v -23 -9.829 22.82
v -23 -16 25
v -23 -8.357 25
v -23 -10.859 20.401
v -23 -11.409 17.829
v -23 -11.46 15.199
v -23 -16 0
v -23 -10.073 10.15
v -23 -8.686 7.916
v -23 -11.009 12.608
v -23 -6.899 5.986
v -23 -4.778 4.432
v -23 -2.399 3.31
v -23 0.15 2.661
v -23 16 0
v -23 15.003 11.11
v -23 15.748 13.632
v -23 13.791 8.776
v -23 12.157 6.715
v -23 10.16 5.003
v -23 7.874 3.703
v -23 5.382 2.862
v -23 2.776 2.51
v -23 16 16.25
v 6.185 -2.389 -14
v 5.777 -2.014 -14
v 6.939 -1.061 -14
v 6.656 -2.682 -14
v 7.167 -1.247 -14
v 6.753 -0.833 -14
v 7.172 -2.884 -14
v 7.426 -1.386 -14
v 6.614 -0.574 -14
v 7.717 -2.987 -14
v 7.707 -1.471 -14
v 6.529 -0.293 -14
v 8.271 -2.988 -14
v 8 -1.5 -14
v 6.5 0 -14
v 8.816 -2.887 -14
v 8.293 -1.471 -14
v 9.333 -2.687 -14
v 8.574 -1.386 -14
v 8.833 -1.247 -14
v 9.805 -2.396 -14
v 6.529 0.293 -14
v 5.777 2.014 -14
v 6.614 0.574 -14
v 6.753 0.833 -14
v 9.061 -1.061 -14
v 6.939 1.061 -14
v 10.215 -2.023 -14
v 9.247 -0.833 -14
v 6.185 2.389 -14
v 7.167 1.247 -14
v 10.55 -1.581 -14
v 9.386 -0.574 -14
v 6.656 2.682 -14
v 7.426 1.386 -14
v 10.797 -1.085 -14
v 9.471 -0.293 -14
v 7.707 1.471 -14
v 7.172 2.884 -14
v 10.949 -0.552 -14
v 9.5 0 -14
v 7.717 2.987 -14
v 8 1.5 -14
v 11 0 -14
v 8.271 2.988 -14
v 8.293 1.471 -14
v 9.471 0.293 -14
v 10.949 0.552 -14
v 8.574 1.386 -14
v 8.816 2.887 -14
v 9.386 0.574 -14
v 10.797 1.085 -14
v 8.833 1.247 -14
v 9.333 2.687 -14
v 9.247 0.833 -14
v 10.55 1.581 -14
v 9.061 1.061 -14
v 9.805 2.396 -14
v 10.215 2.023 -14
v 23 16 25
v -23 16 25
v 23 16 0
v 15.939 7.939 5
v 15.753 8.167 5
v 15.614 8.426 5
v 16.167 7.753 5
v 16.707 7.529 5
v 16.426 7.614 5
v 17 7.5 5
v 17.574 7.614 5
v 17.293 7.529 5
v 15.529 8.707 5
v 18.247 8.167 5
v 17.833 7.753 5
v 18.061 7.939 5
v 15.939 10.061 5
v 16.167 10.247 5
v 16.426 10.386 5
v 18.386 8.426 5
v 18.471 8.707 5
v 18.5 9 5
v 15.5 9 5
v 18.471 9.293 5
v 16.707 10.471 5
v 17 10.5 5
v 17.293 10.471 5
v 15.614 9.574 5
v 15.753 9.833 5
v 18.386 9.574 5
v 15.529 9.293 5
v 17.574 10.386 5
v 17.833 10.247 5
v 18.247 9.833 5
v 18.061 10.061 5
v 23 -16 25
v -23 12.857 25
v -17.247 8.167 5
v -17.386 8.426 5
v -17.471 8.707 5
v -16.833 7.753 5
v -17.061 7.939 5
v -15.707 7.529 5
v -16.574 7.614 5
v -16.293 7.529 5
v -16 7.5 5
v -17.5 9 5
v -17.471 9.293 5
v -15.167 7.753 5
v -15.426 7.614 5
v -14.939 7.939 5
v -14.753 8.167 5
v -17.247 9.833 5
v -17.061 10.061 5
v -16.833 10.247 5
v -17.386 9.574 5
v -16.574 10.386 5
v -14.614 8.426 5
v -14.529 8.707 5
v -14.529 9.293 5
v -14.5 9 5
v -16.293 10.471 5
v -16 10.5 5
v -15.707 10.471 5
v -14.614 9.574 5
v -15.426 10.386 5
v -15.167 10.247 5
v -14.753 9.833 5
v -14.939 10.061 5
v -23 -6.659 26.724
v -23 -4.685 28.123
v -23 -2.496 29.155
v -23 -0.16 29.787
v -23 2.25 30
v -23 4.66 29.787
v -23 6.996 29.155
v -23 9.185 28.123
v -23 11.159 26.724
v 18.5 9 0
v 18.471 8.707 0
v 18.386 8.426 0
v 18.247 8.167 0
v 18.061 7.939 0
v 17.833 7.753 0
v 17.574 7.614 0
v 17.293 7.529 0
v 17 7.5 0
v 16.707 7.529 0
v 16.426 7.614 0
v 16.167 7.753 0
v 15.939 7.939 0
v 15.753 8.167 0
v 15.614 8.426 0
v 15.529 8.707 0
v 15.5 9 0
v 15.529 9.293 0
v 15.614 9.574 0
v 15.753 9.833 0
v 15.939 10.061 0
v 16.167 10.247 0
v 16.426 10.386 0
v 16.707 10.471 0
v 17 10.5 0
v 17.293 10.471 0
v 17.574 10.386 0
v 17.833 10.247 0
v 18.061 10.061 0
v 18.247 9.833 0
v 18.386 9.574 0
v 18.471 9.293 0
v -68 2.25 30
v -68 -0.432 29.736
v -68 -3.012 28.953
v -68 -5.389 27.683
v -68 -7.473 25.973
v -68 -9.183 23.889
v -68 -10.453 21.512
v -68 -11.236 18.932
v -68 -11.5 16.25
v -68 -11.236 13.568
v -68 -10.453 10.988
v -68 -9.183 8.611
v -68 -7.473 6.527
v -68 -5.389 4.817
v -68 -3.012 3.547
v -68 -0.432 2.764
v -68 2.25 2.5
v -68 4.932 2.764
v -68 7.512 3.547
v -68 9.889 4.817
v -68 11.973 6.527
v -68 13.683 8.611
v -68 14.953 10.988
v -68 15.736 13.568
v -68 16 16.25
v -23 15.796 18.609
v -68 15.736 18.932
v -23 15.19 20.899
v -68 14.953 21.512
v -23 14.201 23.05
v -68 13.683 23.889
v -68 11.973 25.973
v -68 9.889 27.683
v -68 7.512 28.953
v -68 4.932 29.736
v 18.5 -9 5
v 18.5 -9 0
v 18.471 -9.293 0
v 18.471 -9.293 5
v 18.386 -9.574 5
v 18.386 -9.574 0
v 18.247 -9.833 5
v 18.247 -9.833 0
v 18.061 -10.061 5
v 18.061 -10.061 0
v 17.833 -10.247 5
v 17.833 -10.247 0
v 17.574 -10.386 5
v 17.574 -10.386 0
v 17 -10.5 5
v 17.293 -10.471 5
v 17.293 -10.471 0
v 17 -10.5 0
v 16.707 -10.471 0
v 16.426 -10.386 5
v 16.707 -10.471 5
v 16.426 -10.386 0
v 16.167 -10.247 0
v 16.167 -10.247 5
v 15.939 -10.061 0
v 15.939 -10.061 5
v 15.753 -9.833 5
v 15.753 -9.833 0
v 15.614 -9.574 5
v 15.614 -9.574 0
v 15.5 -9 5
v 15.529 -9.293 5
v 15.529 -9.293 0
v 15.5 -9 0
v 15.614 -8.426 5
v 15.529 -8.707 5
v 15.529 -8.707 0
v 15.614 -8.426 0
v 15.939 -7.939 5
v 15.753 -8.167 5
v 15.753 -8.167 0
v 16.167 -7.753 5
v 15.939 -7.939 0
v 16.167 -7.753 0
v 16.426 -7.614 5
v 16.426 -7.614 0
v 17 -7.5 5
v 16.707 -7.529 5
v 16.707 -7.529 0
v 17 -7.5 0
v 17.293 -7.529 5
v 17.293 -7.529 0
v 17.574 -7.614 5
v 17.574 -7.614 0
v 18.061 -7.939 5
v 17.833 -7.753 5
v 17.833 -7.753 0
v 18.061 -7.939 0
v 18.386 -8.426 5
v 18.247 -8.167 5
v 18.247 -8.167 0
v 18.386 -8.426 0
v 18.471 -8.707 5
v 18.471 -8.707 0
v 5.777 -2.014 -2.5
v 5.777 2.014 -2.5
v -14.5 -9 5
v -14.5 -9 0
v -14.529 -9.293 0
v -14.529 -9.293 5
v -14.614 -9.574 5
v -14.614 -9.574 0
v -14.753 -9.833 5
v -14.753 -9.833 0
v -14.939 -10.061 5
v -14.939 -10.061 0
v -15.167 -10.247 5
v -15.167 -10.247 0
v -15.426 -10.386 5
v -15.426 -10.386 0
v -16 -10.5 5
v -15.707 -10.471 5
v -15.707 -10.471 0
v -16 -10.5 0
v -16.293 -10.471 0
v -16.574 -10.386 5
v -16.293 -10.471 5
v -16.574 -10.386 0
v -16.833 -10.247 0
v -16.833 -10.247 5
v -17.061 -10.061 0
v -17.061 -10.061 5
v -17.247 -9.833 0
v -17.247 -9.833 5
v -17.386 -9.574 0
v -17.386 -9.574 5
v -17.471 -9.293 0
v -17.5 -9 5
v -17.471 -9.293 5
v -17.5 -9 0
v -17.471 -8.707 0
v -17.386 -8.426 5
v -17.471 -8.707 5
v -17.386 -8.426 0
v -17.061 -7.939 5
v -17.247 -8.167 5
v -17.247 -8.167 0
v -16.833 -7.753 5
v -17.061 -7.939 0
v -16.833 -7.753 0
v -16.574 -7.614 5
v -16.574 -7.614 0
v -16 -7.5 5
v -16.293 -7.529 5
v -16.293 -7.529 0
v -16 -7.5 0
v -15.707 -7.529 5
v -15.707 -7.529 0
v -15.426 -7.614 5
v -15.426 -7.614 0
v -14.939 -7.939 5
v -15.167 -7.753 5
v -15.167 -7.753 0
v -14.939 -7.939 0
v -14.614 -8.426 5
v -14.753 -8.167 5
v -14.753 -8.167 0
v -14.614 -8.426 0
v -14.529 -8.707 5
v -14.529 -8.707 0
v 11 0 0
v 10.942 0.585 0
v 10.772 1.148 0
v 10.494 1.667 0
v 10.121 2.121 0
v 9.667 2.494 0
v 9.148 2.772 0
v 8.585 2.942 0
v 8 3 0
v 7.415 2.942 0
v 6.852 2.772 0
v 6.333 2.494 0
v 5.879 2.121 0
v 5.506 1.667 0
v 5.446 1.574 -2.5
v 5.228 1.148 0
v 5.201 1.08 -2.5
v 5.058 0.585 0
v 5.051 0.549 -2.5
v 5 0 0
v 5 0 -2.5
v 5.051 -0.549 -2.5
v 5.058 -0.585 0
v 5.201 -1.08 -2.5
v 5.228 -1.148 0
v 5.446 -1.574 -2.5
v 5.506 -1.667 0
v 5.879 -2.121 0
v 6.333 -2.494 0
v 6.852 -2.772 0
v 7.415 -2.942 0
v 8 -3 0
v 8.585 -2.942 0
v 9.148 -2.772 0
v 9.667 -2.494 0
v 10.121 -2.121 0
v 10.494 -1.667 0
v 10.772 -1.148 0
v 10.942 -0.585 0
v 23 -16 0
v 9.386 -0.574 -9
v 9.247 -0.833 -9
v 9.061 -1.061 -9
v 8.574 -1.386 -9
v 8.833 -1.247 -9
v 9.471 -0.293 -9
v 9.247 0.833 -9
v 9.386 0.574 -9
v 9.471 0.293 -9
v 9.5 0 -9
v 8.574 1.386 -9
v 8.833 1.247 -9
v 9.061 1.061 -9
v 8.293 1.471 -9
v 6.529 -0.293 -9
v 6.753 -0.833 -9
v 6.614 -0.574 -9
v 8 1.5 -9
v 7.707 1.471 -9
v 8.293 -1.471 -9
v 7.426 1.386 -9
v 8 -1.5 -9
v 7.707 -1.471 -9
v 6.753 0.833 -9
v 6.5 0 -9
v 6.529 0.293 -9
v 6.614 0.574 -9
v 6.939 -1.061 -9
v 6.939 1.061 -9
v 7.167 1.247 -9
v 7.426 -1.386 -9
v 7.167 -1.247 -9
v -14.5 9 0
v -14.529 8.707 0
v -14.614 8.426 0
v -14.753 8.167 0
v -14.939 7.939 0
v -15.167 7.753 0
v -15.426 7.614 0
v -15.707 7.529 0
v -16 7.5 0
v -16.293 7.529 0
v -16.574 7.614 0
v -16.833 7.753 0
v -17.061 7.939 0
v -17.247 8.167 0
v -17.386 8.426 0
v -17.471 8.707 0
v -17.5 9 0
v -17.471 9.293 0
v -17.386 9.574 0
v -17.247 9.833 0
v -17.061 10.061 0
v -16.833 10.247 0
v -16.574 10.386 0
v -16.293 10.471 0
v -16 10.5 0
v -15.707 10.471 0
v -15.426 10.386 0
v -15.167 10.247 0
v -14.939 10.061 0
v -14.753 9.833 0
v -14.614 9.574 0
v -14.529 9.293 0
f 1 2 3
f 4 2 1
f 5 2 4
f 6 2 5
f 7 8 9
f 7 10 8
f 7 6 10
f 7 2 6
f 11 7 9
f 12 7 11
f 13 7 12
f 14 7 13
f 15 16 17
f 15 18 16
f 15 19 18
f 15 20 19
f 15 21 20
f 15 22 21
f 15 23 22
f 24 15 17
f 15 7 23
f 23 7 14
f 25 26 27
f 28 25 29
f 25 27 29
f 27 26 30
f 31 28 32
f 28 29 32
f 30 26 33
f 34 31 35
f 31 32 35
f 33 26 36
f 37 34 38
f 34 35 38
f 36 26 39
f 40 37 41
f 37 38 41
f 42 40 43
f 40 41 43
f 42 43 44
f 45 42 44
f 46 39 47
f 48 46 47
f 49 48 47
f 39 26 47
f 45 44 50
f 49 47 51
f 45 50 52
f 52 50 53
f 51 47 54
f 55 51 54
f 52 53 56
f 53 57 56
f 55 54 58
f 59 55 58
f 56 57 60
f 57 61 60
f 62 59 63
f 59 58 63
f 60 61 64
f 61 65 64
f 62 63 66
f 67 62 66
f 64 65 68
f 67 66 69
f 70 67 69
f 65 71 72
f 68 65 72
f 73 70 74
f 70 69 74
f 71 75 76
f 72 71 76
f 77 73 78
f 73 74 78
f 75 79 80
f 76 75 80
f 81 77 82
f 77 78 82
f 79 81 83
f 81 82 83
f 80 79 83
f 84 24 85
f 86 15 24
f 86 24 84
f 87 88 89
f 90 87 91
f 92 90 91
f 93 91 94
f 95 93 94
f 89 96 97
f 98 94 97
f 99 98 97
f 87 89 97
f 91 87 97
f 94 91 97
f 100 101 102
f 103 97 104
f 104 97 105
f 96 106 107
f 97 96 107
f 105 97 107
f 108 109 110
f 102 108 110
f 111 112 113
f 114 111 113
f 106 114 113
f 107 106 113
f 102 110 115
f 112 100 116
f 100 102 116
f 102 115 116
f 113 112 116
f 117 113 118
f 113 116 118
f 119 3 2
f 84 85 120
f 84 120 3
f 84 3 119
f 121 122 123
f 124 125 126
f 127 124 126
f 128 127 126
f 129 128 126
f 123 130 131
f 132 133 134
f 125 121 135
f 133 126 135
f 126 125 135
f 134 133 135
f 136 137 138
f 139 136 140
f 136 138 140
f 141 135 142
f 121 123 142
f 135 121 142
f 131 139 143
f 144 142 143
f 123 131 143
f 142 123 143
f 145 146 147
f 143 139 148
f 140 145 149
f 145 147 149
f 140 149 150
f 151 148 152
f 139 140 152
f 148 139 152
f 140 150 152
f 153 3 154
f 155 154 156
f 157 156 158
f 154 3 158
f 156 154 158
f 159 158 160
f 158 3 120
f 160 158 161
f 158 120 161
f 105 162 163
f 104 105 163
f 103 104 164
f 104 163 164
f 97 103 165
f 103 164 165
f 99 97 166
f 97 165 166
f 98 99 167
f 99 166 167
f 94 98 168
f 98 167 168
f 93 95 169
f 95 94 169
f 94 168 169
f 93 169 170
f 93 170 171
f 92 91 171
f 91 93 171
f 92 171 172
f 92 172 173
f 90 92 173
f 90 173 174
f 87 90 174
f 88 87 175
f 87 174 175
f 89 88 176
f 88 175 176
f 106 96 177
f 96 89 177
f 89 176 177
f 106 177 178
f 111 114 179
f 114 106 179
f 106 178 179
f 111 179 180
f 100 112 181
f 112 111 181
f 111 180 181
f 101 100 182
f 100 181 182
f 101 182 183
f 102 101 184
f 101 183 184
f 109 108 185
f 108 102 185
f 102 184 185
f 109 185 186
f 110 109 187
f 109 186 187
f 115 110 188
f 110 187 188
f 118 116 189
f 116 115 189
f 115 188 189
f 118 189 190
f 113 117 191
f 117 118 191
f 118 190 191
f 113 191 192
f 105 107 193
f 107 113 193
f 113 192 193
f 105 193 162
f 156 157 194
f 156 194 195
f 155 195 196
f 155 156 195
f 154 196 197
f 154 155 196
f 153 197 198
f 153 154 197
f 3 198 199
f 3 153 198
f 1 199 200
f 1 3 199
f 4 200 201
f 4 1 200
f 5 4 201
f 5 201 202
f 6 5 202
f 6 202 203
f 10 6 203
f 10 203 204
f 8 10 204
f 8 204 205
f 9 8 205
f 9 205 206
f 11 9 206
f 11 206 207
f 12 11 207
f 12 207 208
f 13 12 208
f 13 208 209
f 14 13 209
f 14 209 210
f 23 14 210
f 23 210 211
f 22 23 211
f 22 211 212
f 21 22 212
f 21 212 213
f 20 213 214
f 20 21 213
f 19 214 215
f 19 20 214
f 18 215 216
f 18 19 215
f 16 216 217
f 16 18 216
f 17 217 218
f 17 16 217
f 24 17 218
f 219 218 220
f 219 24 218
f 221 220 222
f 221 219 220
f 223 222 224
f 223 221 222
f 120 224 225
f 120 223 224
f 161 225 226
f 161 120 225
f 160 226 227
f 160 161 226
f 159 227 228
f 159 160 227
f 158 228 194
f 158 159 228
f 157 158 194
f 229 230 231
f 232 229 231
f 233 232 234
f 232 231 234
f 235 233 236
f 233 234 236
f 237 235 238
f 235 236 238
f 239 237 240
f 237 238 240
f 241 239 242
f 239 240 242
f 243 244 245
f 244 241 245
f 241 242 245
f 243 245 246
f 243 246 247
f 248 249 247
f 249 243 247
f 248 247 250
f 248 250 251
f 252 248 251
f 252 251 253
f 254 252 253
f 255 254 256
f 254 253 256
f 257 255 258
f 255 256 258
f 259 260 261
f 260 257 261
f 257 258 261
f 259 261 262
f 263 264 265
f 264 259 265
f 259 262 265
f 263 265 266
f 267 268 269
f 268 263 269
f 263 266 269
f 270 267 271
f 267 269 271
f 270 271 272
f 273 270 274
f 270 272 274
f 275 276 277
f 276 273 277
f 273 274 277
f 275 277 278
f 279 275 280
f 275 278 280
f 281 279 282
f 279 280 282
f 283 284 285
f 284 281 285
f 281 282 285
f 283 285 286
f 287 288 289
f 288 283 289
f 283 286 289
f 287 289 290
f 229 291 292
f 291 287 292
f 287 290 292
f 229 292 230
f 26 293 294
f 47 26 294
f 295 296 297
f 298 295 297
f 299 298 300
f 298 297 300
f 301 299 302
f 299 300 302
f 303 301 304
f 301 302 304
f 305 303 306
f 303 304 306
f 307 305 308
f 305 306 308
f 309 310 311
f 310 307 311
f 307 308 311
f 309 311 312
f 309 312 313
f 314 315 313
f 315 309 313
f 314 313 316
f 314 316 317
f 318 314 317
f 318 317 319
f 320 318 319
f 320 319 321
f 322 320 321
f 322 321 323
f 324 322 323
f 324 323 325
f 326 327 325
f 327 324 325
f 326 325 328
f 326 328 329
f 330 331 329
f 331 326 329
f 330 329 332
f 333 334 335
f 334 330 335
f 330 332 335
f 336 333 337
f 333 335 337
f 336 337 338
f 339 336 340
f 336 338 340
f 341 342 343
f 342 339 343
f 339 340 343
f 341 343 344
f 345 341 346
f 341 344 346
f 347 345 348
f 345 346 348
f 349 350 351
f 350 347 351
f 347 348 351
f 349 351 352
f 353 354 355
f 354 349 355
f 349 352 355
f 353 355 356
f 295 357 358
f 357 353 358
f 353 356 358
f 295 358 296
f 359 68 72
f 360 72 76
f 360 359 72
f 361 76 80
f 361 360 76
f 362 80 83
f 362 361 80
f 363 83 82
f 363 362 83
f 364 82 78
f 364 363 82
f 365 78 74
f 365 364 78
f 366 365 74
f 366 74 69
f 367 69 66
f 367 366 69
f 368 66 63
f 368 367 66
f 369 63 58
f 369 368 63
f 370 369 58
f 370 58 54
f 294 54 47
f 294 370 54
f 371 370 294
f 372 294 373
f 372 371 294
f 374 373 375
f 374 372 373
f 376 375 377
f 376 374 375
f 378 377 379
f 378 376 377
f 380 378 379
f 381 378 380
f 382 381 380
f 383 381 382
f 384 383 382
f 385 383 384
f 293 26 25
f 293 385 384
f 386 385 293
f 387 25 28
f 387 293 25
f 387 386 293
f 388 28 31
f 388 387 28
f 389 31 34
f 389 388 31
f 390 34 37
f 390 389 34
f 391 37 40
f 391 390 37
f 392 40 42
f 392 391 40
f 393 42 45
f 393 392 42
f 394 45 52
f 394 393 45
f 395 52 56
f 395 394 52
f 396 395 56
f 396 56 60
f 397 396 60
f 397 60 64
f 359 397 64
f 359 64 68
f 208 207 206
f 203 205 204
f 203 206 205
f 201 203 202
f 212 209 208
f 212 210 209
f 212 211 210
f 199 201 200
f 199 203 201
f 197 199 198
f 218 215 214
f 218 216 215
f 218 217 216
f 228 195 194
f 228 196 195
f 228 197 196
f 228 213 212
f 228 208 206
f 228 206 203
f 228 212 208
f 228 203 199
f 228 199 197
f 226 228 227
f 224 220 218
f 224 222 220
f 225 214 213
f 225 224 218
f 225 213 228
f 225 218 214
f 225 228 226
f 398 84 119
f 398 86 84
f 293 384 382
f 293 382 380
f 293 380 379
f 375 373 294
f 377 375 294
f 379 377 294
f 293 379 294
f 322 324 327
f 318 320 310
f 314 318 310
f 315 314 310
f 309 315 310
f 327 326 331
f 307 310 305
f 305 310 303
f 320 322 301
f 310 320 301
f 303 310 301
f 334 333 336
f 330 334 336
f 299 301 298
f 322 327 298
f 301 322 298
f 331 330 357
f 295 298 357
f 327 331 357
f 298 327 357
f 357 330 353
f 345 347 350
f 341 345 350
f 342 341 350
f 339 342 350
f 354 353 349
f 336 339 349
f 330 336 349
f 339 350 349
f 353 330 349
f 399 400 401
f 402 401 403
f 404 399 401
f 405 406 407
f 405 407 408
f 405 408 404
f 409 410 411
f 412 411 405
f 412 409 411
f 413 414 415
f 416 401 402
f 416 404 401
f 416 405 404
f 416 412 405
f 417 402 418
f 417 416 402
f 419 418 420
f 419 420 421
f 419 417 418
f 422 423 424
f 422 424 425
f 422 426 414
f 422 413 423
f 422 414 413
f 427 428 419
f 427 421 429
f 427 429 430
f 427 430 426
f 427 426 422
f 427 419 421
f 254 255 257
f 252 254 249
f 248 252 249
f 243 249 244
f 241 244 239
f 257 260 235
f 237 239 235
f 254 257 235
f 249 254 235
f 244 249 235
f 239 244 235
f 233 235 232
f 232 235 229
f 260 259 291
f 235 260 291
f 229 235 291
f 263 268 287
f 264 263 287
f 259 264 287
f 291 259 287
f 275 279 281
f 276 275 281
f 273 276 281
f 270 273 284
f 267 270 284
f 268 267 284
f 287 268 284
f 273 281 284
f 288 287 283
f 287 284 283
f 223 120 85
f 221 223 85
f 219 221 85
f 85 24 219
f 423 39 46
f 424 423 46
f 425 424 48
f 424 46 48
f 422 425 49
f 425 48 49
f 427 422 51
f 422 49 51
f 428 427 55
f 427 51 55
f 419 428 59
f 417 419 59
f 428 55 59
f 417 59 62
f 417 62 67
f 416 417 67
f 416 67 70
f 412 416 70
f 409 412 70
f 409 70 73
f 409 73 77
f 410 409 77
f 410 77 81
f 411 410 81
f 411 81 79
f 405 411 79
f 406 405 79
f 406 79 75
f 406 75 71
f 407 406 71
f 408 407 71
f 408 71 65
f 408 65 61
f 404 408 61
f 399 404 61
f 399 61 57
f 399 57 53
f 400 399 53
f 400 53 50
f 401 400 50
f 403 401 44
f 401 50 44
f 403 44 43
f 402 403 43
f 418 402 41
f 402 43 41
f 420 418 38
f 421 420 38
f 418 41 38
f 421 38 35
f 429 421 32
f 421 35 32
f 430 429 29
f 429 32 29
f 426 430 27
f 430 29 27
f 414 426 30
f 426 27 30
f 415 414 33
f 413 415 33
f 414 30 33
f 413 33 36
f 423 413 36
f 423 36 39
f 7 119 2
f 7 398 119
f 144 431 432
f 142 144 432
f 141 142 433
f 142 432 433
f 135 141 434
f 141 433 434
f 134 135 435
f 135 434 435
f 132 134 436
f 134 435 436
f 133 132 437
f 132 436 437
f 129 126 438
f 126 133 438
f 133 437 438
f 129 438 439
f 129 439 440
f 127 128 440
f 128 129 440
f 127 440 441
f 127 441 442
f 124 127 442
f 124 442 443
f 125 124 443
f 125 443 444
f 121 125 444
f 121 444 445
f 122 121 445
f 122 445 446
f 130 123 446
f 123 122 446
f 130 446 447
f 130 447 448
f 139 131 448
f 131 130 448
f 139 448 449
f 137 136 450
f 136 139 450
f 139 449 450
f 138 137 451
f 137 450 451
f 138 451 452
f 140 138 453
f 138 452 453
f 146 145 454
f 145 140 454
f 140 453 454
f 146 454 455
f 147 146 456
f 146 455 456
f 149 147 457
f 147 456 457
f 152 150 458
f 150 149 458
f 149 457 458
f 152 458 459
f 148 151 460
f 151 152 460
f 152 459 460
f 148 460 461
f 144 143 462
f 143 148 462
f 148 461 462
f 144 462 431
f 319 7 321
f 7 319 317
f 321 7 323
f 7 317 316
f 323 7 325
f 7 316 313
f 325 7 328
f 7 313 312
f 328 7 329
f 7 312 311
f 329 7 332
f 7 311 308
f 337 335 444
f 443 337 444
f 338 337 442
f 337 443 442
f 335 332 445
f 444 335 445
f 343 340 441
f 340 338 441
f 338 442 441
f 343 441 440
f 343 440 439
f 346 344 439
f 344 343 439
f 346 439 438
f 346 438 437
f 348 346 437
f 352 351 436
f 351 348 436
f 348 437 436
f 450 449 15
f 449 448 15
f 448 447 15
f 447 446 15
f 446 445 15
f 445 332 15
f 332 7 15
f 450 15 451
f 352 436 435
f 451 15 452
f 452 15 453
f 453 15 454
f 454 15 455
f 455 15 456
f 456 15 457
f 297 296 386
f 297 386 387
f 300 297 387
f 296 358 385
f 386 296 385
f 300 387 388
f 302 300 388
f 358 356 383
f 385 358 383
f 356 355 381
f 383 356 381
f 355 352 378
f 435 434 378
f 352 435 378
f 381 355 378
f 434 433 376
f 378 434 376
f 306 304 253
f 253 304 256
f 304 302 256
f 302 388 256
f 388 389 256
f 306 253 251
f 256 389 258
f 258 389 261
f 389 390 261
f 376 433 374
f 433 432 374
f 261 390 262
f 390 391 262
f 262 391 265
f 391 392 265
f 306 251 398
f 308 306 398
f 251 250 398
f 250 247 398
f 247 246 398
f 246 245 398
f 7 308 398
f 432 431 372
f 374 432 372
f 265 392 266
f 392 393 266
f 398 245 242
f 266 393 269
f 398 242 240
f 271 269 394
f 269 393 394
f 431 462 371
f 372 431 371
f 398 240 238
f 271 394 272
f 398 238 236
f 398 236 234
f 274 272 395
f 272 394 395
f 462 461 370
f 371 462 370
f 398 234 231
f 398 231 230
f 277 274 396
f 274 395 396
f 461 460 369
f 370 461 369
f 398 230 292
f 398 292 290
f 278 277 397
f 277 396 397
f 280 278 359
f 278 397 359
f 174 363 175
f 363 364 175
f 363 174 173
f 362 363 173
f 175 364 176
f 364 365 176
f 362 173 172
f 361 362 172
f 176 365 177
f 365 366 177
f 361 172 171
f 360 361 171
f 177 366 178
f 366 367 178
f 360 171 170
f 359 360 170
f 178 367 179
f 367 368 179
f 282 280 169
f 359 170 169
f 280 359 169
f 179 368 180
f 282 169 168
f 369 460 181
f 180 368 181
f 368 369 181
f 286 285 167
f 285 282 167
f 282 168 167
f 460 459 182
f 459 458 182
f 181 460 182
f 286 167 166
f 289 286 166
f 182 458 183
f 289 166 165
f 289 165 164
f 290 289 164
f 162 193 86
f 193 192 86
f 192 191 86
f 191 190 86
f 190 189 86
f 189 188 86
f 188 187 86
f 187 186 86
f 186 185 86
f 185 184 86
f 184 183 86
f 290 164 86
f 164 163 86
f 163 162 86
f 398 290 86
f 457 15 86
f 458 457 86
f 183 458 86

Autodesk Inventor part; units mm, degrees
ref_plane "YZ Plane" through (0, 0, 0) normal (1, 0, 0) x (0, 1, 0)
ref_plane "XZ Plane" through (0, 0, 0) normal (0, 1, 0) x (-1, 0, 0)
ref_plane "XY Plane" through (0, 0, 0) normal (0, 0, 1) x (1, 0, 0)
sketch "Sketch1" plane through (0, 0, 0) normal (0, 0, 1) x (1, 0, 0)
  line L0 (23, -16) -> (-23, -16)
  line L1 (-23, -16) -> (-23, 16)
  line L2 (-23, 16) -> (23, 16)
  line L3 (23, 16) -> (23, -16)
  line L4 (23, -16) -> (-23, 16) construction
  line L5 (-23, -16) -> (23, 16) construction
  line L6 (0, 0) -> (32.2248, 0) construction
  line L7 (0, 0) -> (0, 21.3704) construction
  circle A0 centre (8, 0) radius 3
  circle A1 centre (17, 9) radius 1.5
  circle A2 centre (-16, 9) radius 1.5
  line L8 (17, 9) -> (-16, 9) construction
  circle A3 centre (17, -9) radius 1.5
  circle A4 centre (-16, -9) radius 1.5
  line L9 (5.7769, -2.0144) -> (5.7769, 2.0144)
  dimension "d0" = 46
  dimension "d1" = 32
  dimension "d2" = 6
  dimension "d3" = 15
  dimension "d7" = 3
  dimension "d9" = 3
  dimension "d14" = 33
  dimension "d15" = 9
  dimension "d16" = 9
extrude "Extrusion1" add sketch "Sketch1" against normal blind 14 contours A0 L9 picked at (7.5179, 0)
extrude "Extrusion2" add sketch "Sketch1" against normal blind 2.5 contours A0 L9 | L9 A0
extrude "Extrusion3" add sketch "Sketch1" along normal blind 25 contours L0 L1 L2 L3 | A0 L9 | L9 A0 | A1 | A2 | A3 | A4
extrude "Extrusion4" cut sketch "Sketch1" along normal blind 5 contours A1 | A2 | A3 | A4
sketch "Sketch2" plane through (-23, -16, 0) normal (-1, 0, 0) x (0, 0, 1)
  circle A0 centre (16.25, 18.25) radius 13.75
  line L0 (0, 32) -> (25, 32) projected
  line L1 (0, 0) -> (0, 32) projected
  point P0 (0, 16)
  dimension "d23" = 27.5
  dimension "d24" = 16.25
extrude "Extrusion5" add sketch "Sketch2" along normal blind 45
sketch "Sketch3" plane through (0, 0, -14) normal (0, 0, -1) x (-1, 0, 0)
  arc A0 (-5.7769, 2.0144) -> (-5.7769, -2.0144) centre (-8, 0) ccw projected
  circle A1 centre (-8, 0) radius 1.5
  point P0 (0, 0)
  dimension "d29" = 3
extrude "Extrusion7" cut sketch "Sketch3" against normal blind 5
properties part number "motor"
